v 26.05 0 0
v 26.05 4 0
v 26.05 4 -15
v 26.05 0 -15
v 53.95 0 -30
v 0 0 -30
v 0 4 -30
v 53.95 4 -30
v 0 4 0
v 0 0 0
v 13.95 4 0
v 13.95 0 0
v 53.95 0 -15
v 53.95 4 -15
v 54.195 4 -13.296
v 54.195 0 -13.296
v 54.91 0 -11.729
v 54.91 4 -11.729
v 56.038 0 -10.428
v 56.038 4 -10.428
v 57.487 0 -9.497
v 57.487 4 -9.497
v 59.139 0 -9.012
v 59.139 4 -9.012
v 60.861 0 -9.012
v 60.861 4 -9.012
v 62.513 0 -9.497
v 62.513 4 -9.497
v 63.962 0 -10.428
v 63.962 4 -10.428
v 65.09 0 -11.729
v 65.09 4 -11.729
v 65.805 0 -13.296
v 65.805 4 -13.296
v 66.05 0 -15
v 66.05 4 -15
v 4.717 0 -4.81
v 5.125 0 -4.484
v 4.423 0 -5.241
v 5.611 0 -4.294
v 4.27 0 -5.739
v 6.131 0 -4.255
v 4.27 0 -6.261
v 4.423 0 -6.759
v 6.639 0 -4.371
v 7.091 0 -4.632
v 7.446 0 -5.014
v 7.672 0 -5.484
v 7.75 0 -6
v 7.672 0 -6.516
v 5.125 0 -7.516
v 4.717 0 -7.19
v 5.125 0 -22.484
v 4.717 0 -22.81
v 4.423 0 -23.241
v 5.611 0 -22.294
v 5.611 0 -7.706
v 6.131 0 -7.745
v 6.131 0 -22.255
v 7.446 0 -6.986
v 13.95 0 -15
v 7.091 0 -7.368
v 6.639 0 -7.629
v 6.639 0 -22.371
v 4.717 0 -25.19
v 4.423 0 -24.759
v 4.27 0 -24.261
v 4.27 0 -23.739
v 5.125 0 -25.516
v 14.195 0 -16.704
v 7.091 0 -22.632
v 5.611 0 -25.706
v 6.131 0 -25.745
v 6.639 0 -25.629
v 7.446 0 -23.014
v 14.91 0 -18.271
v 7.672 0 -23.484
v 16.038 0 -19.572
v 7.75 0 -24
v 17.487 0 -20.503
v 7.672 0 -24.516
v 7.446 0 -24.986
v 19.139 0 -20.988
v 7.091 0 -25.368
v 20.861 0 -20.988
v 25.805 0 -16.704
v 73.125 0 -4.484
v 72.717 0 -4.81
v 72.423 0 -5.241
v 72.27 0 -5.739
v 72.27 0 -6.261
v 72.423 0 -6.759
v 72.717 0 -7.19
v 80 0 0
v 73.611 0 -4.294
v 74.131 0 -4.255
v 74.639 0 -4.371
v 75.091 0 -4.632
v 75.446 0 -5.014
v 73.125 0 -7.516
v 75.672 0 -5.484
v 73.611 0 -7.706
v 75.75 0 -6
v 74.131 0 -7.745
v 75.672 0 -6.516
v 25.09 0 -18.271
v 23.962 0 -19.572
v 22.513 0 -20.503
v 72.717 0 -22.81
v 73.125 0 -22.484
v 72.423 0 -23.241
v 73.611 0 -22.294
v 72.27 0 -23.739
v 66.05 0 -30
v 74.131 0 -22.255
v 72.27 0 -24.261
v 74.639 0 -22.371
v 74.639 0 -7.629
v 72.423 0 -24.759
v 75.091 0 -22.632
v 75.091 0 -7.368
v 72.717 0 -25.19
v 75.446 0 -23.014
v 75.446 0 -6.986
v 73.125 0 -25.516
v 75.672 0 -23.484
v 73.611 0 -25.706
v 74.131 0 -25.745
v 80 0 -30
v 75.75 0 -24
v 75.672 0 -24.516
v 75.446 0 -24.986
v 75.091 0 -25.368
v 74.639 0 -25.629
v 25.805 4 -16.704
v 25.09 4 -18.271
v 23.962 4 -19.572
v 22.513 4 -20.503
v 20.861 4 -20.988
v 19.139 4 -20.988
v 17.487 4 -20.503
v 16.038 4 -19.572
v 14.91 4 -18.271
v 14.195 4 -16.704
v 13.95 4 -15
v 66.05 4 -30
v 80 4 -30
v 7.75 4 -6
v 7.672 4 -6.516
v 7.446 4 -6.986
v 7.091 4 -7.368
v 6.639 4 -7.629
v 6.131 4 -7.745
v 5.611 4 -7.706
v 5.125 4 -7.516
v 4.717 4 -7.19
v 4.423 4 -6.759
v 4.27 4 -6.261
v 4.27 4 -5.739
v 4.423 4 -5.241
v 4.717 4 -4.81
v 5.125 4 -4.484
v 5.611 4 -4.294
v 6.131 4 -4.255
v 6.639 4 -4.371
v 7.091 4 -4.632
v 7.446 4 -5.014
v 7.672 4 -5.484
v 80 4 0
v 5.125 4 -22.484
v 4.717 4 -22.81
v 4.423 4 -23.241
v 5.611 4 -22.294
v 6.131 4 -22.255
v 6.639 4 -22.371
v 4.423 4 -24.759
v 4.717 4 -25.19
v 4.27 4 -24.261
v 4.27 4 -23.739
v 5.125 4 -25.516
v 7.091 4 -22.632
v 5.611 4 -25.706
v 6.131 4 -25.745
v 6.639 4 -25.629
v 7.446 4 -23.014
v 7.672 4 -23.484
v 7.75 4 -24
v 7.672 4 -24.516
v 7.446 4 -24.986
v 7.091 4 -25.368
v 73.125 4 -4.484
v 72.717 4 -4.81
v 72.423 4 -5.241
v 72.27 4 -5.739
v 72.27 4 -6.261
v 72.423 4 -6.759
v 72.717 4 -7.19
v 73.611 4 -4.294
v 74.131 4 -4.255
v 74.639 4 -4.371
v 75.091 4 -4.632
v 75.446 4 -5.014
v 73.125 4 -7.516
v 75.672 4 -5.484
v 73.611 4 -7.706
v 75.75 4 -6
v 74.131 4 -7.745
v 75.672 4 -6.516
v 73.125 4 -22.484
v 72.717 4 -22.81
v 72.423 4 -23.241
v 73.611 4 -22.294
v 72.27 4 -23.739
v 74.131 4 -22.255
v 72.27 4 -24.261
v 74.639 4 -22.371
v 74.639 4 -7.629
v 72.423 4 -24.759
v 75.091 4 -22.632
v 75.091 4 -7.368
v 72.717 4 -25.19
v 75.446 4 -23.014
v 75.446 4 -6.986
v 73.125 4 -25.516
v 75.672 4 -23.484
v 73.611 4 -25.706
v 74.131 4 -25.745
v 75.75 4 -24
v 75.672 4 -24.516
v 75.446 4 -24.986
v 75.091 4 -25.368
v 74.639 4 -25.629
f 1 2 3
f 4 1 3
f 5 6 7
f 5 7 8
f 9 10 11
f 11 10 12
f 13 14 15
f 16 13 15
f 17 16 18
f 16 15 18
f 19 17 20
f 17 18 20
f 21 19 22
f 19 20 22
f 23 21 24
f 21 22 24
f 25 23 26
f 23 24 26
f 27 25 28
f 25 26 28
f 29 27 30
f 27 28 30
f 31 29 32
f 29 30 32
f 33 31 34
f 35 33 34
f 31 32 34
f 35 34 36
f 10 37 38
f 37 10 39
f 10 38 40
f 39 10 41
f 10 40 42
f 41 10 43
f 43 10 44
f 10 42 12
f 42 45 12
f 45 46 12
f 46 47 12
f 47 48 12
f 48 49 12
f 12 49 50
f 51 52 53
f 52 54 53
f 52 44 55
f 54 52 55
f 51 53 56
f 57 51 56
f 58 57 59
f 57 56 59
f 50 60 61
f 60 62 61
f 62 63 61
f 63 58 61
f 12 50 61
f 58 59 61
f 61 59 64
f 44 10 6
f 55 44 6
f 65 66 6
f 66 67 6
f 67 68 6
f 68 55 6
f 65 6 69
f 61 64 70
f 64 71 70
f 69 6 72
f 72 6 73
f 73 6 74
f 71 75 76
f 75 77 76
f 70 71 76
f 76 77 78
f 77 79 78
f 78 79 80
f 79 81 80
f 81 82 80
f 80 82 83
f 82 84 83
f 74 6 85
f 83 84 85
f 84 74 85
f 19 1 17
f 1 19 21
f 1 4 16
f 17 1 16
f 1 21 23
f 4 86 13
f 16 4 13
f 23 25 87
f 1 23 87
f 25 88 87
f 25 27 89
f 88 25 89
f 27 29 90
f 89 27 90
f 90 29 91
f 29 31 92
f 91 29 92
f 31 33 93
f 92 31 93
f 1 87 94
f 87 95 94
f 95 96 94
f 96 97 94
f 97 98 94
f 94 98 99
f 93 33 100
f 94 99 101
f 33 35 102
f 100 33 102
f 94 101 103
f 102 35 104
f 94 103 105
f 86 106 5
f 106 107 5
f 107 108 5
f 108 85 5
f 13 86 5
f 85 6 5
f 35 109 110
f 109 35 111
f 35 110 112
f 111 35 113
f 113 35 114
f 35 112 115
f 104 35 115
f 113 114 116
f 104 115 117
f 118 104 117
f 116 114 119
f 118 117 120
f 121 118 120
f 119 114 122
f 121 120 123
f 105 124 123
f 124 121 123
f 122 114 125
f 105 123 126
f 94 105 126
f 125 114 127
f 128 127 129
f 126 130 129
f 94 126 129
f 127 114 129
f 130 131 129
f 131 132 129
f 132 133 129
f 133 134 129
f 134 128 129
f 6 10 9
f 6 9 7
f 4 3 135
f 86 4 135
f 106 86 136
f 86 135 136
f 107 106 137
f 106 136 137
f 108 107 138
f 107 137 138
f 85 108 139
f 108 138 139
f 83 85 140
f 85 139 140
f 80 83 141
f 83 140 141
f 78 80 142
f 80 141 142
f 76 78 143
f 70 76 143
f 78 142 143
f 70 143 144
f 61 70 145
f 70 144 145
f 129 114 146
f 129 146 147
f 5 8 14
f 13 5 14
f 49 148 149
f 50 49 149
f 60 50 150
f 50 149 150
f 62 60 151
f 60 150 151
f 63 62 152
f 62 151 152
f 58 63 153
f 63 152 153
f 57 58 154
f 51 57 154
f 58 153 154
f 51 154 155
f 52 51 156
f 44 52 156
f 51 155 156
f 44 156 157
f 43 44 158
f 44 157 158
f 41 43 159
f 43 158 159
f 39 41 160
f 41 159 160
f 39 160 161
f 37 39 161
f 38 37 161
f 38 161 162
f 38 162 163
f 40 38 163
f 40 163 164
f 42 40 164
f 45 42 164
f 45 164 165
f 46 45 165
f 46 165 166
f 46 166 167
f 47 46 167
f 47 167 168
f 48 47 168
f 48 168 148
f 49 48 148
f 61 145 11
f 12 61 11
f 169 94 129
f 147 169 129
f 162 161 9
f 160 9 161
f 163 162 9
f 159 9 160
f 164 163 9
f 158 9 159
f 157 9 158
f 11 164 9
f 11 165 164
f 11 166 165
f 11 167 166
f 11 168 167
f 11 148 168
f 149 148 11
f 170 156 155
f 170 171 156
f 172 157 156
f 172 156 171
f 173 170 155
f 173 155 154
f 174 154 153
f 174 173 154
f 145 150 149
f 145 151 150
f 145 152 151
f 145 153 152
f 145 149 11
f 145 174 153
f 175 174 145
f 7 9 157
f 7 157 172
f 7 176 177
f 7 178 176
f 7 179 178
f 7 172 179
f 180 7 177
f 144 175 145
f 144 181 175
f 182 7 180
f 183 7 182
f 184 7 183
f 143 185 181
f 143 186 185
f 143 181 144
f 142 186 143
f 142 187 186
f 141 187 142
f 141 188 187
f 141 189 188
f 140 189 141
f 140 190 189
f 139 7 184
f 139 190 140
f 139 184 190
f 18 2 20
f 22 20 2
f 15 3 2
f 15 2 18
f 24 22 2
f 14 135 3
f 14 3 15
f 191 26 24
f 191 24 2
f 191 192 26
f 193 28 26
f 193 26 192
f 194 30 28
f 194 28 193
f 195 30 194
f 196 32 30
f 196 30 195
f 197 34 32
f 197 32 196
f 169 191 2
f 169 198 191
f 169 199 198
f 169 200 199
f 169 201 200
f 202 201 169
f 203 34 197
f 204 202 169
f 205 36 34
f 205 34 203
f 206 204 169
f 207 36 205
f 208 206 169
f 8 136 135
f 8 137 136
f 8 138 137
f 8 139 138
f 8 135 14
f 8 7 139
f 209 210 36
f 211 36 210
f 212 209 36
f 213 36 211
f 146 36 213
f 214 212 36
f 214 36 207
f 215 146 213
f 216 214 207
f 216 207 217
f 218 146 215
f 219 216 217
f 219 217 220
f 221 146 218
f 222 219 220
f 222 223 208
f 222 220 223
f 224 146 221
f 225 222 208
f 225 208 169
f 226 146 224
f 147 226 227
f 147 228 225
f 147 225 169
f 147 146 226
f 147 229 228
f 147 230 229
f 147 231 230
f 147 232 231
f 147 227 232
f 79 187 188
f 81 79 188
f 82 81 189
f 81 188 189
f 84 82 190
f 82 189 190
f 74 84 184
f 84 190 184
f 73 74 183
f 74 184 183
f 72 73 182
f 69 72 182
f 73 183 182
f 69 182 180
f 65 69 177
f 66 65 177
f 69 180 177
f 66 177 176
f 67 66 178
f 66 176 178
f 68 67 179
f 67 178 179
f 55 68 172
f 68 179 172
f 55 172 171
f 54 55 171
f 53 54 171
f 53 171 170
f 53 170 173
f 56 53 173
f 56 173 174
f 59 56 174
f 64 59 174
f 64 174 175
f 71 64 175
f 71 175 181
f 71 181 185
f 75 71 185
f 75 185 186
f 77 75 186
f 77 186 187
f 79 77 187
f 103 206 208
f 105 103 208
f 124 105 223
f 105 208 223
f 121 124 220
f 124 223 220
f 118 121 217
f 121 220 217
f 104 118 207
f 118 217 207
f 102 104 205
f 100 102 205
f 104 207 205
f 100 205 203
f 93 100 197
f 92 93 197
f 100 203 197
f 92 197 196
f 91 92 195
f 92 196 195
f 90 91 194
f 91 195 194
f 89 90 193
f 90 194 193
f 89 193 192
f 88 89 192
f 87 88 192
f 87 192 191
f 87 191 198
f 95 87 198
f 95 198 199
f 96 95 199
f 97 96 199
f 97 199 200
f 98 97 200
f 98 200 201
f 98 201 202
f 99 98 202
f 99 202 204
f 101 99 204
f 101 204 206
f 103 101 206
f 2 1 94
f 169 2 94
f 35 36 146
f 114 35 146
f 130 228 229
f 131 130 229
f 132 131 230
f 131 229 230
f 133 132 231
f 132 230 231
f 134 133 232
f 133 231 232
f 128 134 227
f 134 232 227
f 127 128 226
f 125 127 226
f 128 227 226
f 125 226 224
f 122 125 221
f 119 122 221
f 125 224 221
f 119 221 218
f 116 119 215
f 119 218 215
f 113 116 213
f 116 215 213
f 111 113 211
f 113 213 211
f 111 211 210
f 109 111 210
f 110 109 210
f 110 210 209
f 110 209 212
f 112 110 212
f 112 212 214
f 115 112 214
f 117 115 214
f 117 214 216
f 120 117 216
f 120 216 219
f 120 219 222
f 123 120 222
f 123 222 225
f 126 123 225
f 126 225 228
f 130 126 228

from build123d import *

# Parameters (mm, degrees)
SKETCH2_W           = 80
SKETCH2_H           = 30
BOSS_EXTRUDE1_DEPTH = 4
SKETCH3_R           = 1.75
CUT_EXTRUDE1_DEPTH  = 5


with BuildPart() as part:
    # Sketch2 → Boss-Extrude1 (new body)
    with BuildSketch(Plane(origin=(0, 0, 0), x_dir=(1, 0, 0), z_dir=(0, 1, 0))):
        with Locations((40, 15)):
            Rectangle(SKETCH2_W, SKETCH2_H)
    extrude(amount=BOSS_EXTRUDE1_DEPTH)

    # Sketch3 → Cut-Extrude1 (cut, through all)
    with BuildSketch(Plane(origin=(0, 4, 0), x_dir=(1, 0, 0), z_dir=(0, 1, 0))):
        with Locations((6, 6)):
            Circle(SKETCH3_R)
        with Locations((6, 24)):
            Circle(SKETCH3_R)
        with Locations((74, 24)):
            Circle(SKETCH3_R)
        with Locations((74, 6)):
            Circle(SKETCH3_R)
        with BuildLine():
            Line((13.95, 0), (26.05, 0))
            Line((26.05, 0), (26.05, 15))
            ThreePointArc((26.05, 15), (20, 21.05), (13.95, 15))
            Line((13.95, 15), (13.95, 0))
        make_face()
        with BuildLine():
            Line((53.95, 30), (53.95, 15))
            ThreePointArc((53.95, 15), (60, 8.95), (66.05, 15))
            Line((66.05, 15), (66.05, 30))
            Line((66.05, 30), (53.95, 30))
        make_face()
    extrude(amount=-CUT_EXTRUDE1_DEPTH, mode=Mode.SUBTRACT)


solid = part.part
